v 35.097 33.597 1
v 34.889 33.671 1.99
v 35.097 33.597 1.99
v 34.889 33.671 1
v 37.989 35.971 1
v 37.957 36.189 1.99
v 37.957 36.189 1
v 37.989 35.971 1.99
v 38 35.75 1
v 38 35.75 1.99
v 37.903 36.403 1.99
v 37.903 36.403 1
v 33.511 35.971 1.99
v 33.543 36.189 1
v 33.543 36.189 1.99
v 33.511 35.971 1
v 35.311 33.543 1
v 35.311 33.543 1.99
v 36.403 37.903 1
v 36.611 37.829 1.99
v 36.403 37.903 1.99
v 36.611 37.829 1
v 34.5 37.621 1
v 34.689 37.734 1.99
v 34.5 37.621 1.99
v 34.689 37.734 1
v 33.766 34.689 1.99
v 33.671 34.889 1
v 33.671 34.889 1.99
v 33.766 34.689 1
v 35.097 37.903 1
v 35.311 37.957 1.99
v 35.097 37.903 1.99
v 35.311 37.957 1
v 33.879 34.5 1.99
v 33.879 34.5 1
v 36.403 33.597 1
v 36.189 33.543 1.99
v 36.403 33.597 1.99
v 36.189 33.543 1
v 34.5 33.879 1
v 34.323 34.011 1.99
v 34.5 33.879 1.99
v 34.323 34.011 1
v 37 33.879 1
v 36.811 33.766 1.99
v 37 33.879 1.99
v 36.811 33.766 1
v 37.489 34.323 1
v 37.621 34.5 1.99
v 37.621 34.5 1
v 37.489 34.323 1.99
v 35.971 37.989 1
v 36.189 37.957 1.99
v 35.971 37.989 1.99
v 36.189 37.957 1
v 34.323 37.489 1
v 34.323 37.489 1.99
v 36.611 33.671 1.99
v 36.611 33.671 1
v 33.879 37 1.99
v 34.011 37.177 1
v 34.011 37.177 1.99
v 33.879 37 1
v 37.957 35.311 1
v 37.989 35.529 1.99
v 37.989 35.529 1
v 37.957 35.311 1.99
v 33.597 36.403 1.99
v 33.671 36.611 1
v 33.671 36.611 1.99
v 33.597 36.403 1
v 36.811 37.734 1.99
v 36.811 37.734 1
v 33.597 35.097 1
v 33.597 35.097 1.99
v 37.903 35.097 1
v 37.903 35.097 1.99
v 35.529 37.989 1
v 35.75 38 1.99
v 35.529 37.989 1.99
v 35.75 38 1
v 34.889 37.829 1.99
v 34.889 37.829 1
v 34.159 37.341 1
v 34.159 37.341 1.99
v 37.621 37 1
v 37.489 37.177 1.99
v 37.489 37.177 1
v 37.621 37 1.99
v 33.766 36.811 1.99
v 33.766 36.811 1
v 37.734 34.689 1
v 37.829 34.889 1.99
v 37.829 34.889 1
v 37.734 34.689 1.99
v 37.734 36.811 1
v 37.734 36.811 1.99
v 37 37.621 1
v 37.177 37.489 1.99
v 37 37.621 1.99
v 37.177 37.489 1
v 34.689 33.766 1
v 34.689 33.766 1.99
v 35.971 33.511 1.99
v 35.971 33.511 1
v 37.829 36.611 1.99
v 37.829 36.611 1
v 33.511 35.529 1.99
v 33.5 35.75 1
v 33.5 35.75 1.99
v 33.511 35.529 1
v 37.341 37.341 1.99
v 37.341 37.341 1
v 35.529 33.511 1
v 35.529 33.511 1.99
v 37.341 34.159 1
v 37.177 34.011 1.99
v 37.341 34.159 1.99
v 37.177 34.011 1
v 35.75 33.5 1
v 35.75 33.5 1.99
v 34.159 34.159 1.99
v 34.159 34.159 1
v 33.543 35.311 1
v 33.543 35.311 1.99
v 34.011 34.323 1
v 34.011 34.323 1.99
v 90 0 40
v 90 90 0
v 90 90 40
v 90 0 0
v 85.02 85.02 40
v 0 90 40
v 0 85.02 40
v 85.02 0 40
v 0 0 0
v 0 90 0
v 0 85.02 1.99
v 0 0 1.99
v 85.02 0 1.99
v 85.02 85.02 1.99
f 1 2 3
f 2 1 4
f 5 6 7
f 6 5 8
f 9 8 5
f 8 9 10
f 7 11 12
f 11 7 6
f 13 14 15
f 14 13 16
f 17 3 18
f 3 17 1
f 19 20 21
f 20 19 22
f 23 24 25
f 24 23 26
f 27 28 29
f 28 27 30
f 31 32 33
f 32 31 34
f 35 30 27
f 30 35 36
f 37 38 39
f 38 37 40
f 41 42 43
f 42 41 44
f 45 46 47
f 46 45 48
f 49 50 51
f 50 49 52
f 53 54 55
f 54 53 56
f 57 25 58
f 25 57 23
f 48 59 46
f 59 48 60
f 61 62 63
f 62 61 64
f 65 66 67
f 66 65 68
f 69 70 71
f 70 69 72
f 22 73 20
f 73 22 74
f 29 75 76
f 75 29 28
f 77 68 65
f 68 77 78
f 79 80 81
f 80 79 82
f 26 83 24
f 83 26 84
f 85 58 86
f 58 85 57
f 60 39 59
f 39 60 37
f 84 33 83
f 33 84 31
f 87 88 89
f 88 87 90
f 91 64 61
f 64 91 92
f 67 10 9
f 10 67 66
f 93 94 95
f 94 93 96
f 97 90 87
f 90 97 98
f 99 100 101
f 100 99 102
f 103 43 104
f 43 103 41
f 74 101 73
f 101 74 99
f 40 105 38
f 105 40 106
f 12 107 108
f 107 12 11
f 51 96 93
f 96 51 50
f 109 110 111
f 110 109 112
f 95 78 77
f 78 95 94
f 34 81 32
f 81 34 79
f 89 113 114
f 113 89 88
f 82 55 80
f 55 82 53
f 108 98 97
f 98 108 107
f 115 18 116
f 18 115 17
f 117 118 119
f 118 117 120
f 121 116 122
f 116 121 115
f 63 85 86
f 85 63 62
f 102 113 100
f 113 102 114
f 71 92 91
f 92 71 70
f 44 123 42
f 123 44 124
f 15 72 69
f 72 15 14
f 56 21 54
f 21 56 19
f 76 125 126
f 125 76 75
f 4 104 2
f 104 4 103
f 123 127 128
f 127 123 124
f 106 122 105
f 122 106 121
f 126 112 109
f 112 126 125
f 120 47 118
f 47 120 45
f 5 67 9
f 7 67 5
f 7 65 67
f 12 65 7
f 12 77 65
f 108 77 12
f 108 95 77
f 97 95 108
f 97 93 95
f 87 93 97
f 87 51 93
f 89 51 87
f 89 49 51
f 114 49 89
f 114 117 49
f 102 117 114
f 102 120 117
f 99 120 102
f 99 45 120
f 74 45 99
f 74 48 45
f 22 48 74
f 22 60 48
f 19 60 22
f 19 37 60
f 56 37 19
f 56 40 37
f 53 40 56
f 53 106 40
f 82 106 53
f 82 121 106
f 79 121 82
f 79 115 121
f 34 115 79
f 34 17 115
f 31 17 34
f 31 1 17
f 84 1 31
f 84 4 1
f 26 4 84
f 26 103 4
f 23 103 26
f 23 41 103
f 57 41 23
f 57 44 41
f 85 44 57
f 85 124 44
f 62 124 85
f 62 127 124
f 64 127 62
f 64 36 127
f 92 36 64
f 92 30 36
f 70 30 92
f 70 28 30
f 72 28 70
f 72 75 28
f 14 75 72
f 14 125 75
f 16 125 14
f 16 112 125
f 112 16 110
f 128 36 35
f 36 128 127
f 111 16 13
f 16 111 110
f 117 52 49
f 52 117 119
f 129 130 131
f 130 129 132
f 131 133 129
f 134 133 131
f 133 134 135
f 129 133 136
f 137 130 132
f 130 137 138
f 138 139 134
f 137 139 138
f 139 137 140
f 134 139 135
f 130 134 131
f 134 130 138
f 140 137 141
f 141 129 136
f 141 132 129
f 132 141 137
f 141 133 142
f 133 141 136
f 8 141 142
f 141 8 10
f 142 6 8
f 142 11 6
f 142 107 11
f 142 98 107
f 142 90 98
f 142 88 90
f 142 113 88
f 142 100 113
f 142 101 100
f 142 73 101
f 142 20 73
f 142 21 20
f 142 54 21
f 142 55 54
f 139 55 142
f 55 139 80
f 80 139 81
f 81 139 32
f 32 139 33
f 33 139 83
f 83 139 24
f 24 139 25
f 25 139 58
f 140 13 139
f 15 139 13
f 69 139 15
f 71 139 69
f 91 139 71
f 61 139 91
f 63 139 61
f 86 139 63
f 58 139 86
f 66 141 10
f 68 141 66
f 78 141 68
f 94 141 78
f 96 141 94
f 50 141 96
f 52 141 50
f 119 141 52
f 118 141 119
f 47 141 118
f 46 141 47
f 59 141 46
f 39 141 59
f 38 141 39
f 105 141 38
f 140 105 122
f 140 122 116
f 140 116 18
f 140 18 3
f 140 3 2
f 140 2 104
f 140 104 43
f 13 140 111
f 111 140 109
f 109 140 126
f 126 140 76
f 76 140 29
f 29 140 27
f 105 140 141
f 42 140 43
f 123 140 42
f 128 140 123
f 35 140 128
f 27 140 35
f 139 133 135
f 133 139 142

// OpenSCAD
$fn = 64;

// Dimensions
outer_width = 90;
outer_height = 90;
total_height = 40;
plate_thickness = 2;
wall_thickness = 2.5;
hole_diameter = 4.5;
hole_pattern_size = 71.5;
notch_width = 12;
notch_depth = 8;

// Calculated positions
half_outer = outer_width / 2;
half_inner = (outer_width - 2 * wall_thickness) / 2;
hole_offset = hole_pattern_size / 2;
notch_center_y = half_outer - wall_thickness / 2;
notch_center_z = total_height - notch_depth / 2;

difference() {
    // Main Body - starts at z = 0, centred on origin in X and Y
    cube([outer_width, outer_height, total_height]);

    // Inner Cavity Cut
    // Extends past Z=2 (plate) and Z=40 (open top)
    // Extends past X=±42.5 and Y=±42.5 (inner walls)
    translate([0, 0, 1.99])
        cube([outer_width - 2 * wall_thickness + 0.02, 
              outer_height - 2 * wall_thickness + 0.02, 
              total_height - 2 + 0.02]);

    // Screw Holes
    for(i = [-1, 1], j = [-1, 1]) {
        translate([i * hole_offset, j * hole_offset, 1])
            cylinder(d = hole_diameter, h = plate_thickness + 0.02);
    }

    // Cable Notch Cut
    // Located in the front wall (Y = +42.5 to +45)
    // Centred along the wall (X = 0)
    // Depth 8mm from open edge (Z = 32 to 40)
    translate([0, notch_center_y, notch_center_z])
        cube([notch_width + 0.02, wall_thickness + 0.02, notch_depth + 0.02]);
}
